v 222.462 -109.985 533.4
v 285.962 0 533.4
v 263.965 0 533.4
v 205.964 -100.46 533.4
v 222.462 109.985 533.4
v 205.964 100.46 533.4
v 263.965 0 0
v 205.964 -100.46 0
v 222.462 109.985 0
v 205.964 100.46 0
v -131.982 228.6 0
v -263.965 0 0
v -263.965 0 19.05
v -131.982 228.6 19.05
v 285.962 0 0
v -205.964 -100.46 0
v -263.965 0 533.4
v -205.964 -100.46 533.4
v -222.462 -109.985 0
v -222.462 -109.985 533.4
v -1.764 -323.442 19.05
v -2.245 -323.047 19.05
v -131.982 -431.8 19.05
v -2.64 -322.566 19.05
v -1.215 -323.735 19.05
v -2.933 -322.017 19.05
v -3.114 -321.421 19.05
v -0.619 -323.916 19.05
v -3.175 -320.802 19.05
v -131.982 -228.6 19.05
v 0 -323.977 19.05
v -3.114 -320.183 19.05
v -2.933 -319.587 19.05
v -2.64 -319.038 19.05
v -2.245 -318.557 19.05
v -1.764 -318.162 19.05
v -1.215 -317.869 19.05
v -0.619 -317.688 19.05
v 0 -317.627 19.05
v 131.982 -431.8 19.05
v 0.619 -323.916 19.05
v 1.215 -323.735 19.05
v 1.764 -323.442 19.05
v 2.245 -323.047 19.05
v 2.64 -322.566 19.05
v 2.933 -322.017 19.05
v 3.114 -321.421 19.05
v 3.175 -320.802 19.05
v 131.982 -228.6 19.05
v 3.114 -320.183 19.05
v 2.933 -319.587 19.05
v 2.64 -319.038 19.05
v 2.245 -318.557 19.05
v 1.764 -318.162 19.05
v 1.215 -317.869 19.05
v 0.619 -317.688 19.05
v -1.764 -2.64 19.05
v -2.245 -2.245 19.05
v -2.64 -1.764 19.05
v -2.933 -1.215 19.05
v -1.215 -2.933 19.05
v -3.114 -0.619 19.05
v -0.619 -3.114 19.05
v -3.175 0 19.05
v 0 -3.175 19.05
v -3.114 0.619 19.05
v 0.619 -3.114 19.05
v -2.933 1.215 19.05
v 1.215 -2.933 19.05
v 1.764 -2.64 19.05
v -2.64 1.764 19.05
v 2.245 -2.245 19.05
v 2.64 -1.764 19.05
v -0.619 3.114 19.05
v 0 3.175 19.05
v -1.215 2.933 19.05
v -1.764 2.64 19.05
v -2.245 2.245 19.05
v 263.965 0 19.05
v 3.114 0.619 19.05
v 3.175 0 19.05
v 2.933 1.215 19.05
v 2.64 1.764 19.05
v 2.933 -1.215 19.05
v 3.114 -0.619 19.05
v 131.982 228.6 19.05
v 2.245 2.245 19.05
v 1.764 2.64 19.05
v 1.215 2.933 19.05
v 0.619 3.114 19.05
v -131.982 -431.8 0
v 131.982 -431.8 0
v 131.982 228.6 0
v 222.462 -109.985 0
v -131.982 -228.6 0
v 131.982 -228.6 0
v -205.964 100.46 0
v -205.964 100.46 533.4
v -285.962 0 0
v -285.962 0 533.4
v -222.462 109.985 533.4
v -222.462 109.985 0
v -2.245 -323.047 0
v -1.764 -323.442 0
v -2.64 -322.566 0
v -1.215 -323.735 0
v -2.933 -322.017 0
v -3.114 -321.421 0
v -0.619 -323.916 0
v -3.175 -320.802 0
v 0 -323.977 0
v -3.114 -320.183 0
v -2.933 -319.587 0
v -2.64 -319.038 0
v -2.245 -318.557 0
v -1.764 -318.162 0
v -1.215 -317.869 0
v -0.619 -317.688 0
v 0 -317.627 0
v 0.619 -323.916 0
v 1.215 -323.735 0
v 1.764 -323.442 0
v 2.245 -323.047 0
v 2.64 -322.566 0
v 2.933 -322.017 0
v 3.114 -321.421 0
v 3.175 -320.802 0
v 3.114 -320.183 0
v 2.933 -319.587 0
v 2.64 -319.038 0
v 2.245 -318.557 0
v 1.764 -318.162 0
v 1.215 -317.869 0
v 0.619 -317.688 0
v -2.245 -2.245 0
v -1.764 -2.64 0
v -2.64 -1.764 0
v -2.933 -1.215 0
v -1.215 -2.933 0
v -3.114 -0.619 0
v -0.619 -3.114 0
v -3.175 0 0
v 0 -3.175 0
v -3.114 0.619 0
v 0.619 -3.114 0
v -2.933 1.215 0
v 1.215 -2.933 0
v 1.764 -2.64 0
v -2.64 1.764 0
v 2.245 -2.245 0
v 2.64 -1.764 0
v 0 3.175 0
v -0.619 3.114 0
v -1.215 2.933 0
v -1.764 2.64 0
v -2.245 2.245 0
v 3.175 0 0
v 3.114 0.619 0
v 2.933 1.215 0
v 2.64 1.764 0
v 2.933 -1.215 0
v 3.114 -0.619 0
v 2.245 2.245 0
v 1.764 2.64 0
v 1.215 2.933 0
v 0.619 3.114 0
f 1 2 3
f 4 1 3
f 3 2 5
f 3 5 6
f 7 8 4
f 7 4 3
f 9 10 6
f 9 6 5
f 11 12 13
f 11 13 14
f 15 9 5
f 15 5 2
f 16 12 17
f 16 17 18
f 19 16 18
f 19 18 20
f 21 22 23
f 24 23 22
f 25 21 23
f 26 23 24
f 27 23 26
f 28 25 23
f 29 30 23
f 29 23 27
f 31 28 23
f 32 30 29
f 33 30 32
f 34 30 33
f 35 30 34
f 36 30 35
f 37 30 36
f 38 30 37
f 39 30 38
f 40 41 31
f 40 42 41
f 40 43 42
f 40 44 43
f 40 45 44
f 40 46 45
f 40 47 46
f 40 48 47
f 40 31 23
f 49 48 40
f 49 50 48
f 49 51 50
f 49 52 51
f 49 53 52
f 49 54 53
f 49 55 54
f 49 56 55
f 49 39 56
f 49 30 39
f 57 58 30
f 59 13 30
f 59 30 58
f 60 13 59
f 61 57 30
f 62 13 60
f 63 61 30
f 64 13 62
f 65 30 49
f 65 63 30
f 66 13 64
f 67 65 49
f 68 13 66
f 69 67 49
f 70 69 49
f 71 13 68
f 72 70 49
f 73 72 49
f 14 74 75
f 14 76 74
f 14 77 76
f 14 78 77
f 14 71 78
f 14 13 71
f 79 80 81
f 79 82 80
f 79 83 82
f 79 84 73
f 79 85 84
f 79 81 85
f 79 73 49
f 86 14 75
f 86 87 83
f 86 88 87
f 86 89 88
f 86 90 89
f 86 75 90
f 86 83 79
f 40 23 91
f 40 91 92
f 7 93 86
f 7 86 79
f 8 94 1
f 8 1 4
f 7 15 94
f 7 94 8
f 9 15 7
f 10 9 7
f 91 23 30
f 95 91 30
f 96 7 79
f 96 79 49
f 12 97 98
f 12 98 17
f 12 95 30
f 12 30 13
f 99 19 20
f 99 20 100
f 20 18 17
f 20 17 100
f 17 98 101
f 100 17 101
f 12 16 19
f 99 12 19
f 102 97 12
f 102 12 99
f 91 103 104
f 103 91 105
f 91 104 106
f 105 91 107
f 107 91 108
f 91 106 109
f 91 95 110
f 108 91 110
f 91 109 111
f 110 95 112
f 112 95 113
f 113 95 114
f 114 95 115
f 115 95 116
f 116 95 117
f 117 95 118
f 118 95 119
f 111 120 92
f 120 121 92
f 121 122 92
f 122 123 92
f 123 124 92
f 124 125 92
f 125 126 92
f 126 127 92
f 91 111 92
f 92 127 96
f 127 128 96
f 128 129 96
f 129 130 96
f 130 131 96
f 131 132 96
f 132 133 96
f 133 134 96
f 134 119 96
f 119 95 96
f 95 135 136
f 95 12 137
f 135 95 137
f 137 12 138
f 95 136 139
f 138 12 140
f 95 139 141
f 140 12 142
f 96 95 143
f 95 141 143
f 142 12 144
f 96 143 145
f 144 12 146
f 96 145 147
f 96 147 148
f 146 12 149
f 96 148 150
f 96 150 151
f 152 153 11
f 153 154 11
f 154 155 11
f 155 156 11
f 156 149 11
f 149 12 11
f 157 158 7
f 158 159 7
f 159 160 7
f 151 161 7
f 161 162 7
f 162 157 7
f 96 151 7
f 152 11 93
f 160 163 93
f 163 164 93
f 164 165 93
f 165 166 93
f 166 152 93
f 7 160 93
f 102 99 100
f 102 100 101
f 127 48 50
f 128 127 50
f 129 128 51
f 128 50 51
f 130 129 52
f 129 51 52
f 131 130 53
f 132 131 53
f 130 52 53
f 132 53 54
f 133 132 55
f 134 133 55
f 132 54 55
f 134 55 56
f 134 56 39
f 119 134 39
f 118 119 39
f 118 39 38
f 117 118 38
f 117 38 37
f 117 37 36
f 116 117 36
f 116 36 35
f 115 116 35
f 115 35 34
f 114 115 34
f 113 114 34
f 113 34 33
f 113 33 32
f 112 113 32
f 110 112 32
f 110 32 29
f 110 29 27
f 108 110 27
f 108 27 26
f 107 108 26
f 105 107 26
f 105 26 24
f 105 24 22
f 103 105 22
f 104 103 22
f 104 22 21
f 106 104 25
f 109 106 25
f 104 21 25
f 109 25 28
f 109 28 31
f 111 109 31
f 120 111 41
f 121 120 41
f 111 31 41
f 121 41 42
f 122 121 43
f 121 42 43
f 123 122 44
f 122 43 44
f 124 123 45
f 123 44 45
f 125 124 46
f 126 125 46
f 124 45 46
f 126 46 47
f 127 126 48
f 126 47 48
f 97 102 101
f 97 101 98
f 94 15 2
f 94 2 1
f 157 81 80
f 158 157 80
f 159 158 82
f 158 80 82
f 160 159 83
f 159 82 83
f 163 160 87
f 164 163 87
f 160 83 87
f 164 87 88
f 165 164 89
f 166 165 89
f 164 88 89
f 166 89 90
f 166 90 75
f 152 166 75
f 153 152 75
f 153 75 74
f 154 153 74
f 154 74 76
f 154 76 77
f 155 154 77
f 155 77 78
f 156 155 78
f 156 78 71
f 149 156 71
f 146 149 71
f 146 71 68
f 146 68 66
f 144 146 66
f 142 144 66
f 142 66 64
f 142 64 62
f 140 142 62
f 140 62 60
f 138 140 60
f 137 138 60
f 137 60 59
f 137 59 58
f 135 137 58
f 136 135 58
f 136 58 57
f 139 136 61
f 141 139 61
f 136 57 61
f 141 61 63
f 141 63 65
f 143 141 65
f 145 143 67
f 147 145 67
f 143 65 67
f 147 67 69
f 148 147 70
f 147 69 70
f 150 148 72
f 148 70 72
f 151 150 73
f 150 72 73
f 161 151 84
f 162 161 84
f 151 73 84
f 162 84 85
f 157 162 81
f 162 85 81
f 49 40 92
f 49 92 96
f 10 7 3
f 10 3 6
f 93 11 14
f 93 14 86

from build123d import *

# Parameters (mm, degrees)
BOSS_EXTRUDE1_DEPTH = 19.05
SKETCH2_W           = 263.964543074
SKETCH2_H           = 203.2
BOSS_EXTRUDE2_DEPTH = 19.05
BOSS_EXTRUDE3_DEPTH = 533.4
SKETCH4_R           = 3.175
CUT_EXTRUDE1_DEPTH  = 730.918620464


with BuildPart() as part:
    # Sketch1 → Boss-Extrude1 (new body)
    with BuildSketch(Plane.XY):
        Polygon((-131.982271537, 228.6), (131.982271537, 228.6), (263.964543073, 0), (131.982271537, -228.6), (-131.982271537, -228.6), (-263.964543073, 0), align=None)
    extrude(amount=BOSS_EXTRUDE1_DEPTH)

    # Sketch2 → Boss-Extrude2 (add)
    with BuildSketch(Plane.XY.offset(19.05)):
        with Locations((0, -330.2)):
            Rectangle(SKETCH2_W, SKETCH2_H)
    extrude(amount=-BOSS_EXTRUDE2_DEPTH)

    # Sketch4 → Cut-Extrude1 (cut, through all)
    with BuildSketch(Plane.XY.offset(19.05)):
        Circle(SKETCH4_R)
        with Locations((0, -320.802)):
            Circle(SKETCH4_R)
    extrude(amount=-CUT_EXTRUDE1_DEPTH, mode=Mode.SUBTRACT)


with BuildPart() as body_2:
    # Sketch3 → Boss-Extrude3 (new body)
    with BuildSketch(Plane(origin=(0, 0, 0), x_dir=(-1, 0, 0), z_dir=(0, 0, -1))):
        Polygon((269.463804388, -9.525), (263.964543073, 0), (205.963804388, -100.460226281), (222.46158833, -109.985226281), (285.96158833, 0), align=None)
        Polygon((269.463804388, 9.525), (263.964543073, 0), (269.463804388, -9.525), (285.96158833, 0), align=None)
        Polygon((222.46158833, 109.985226281), (205.963804388, 100.460226281), (263.964543073, 0), (269.463804388, 9.525), (285.96158833, 0), align=None)
        Polygon((-285.96158833, 0), (-222.46158833, -109.985226281), (-205.963804388, -100.460226281), (-263.964543073, 0), (-269.463804388, -9.525), align=None)
        Polygon((-269.463804388, 9.525), (-285.96158833, 0), (-269.463804388, -9.525), (-263.964543073, 0), align=None)
        Polygon((-222.46158833, 109.985226281), (-285.96158833, 0), (-269.463804388, 9.525), (-263.964543073, 0), (-205.963804388, 100.460226281), align=None)
    extrude(amount=-BOSS_EXTRUDE3_DEPTH)


solid = Compound([part.part, body_2.part])
